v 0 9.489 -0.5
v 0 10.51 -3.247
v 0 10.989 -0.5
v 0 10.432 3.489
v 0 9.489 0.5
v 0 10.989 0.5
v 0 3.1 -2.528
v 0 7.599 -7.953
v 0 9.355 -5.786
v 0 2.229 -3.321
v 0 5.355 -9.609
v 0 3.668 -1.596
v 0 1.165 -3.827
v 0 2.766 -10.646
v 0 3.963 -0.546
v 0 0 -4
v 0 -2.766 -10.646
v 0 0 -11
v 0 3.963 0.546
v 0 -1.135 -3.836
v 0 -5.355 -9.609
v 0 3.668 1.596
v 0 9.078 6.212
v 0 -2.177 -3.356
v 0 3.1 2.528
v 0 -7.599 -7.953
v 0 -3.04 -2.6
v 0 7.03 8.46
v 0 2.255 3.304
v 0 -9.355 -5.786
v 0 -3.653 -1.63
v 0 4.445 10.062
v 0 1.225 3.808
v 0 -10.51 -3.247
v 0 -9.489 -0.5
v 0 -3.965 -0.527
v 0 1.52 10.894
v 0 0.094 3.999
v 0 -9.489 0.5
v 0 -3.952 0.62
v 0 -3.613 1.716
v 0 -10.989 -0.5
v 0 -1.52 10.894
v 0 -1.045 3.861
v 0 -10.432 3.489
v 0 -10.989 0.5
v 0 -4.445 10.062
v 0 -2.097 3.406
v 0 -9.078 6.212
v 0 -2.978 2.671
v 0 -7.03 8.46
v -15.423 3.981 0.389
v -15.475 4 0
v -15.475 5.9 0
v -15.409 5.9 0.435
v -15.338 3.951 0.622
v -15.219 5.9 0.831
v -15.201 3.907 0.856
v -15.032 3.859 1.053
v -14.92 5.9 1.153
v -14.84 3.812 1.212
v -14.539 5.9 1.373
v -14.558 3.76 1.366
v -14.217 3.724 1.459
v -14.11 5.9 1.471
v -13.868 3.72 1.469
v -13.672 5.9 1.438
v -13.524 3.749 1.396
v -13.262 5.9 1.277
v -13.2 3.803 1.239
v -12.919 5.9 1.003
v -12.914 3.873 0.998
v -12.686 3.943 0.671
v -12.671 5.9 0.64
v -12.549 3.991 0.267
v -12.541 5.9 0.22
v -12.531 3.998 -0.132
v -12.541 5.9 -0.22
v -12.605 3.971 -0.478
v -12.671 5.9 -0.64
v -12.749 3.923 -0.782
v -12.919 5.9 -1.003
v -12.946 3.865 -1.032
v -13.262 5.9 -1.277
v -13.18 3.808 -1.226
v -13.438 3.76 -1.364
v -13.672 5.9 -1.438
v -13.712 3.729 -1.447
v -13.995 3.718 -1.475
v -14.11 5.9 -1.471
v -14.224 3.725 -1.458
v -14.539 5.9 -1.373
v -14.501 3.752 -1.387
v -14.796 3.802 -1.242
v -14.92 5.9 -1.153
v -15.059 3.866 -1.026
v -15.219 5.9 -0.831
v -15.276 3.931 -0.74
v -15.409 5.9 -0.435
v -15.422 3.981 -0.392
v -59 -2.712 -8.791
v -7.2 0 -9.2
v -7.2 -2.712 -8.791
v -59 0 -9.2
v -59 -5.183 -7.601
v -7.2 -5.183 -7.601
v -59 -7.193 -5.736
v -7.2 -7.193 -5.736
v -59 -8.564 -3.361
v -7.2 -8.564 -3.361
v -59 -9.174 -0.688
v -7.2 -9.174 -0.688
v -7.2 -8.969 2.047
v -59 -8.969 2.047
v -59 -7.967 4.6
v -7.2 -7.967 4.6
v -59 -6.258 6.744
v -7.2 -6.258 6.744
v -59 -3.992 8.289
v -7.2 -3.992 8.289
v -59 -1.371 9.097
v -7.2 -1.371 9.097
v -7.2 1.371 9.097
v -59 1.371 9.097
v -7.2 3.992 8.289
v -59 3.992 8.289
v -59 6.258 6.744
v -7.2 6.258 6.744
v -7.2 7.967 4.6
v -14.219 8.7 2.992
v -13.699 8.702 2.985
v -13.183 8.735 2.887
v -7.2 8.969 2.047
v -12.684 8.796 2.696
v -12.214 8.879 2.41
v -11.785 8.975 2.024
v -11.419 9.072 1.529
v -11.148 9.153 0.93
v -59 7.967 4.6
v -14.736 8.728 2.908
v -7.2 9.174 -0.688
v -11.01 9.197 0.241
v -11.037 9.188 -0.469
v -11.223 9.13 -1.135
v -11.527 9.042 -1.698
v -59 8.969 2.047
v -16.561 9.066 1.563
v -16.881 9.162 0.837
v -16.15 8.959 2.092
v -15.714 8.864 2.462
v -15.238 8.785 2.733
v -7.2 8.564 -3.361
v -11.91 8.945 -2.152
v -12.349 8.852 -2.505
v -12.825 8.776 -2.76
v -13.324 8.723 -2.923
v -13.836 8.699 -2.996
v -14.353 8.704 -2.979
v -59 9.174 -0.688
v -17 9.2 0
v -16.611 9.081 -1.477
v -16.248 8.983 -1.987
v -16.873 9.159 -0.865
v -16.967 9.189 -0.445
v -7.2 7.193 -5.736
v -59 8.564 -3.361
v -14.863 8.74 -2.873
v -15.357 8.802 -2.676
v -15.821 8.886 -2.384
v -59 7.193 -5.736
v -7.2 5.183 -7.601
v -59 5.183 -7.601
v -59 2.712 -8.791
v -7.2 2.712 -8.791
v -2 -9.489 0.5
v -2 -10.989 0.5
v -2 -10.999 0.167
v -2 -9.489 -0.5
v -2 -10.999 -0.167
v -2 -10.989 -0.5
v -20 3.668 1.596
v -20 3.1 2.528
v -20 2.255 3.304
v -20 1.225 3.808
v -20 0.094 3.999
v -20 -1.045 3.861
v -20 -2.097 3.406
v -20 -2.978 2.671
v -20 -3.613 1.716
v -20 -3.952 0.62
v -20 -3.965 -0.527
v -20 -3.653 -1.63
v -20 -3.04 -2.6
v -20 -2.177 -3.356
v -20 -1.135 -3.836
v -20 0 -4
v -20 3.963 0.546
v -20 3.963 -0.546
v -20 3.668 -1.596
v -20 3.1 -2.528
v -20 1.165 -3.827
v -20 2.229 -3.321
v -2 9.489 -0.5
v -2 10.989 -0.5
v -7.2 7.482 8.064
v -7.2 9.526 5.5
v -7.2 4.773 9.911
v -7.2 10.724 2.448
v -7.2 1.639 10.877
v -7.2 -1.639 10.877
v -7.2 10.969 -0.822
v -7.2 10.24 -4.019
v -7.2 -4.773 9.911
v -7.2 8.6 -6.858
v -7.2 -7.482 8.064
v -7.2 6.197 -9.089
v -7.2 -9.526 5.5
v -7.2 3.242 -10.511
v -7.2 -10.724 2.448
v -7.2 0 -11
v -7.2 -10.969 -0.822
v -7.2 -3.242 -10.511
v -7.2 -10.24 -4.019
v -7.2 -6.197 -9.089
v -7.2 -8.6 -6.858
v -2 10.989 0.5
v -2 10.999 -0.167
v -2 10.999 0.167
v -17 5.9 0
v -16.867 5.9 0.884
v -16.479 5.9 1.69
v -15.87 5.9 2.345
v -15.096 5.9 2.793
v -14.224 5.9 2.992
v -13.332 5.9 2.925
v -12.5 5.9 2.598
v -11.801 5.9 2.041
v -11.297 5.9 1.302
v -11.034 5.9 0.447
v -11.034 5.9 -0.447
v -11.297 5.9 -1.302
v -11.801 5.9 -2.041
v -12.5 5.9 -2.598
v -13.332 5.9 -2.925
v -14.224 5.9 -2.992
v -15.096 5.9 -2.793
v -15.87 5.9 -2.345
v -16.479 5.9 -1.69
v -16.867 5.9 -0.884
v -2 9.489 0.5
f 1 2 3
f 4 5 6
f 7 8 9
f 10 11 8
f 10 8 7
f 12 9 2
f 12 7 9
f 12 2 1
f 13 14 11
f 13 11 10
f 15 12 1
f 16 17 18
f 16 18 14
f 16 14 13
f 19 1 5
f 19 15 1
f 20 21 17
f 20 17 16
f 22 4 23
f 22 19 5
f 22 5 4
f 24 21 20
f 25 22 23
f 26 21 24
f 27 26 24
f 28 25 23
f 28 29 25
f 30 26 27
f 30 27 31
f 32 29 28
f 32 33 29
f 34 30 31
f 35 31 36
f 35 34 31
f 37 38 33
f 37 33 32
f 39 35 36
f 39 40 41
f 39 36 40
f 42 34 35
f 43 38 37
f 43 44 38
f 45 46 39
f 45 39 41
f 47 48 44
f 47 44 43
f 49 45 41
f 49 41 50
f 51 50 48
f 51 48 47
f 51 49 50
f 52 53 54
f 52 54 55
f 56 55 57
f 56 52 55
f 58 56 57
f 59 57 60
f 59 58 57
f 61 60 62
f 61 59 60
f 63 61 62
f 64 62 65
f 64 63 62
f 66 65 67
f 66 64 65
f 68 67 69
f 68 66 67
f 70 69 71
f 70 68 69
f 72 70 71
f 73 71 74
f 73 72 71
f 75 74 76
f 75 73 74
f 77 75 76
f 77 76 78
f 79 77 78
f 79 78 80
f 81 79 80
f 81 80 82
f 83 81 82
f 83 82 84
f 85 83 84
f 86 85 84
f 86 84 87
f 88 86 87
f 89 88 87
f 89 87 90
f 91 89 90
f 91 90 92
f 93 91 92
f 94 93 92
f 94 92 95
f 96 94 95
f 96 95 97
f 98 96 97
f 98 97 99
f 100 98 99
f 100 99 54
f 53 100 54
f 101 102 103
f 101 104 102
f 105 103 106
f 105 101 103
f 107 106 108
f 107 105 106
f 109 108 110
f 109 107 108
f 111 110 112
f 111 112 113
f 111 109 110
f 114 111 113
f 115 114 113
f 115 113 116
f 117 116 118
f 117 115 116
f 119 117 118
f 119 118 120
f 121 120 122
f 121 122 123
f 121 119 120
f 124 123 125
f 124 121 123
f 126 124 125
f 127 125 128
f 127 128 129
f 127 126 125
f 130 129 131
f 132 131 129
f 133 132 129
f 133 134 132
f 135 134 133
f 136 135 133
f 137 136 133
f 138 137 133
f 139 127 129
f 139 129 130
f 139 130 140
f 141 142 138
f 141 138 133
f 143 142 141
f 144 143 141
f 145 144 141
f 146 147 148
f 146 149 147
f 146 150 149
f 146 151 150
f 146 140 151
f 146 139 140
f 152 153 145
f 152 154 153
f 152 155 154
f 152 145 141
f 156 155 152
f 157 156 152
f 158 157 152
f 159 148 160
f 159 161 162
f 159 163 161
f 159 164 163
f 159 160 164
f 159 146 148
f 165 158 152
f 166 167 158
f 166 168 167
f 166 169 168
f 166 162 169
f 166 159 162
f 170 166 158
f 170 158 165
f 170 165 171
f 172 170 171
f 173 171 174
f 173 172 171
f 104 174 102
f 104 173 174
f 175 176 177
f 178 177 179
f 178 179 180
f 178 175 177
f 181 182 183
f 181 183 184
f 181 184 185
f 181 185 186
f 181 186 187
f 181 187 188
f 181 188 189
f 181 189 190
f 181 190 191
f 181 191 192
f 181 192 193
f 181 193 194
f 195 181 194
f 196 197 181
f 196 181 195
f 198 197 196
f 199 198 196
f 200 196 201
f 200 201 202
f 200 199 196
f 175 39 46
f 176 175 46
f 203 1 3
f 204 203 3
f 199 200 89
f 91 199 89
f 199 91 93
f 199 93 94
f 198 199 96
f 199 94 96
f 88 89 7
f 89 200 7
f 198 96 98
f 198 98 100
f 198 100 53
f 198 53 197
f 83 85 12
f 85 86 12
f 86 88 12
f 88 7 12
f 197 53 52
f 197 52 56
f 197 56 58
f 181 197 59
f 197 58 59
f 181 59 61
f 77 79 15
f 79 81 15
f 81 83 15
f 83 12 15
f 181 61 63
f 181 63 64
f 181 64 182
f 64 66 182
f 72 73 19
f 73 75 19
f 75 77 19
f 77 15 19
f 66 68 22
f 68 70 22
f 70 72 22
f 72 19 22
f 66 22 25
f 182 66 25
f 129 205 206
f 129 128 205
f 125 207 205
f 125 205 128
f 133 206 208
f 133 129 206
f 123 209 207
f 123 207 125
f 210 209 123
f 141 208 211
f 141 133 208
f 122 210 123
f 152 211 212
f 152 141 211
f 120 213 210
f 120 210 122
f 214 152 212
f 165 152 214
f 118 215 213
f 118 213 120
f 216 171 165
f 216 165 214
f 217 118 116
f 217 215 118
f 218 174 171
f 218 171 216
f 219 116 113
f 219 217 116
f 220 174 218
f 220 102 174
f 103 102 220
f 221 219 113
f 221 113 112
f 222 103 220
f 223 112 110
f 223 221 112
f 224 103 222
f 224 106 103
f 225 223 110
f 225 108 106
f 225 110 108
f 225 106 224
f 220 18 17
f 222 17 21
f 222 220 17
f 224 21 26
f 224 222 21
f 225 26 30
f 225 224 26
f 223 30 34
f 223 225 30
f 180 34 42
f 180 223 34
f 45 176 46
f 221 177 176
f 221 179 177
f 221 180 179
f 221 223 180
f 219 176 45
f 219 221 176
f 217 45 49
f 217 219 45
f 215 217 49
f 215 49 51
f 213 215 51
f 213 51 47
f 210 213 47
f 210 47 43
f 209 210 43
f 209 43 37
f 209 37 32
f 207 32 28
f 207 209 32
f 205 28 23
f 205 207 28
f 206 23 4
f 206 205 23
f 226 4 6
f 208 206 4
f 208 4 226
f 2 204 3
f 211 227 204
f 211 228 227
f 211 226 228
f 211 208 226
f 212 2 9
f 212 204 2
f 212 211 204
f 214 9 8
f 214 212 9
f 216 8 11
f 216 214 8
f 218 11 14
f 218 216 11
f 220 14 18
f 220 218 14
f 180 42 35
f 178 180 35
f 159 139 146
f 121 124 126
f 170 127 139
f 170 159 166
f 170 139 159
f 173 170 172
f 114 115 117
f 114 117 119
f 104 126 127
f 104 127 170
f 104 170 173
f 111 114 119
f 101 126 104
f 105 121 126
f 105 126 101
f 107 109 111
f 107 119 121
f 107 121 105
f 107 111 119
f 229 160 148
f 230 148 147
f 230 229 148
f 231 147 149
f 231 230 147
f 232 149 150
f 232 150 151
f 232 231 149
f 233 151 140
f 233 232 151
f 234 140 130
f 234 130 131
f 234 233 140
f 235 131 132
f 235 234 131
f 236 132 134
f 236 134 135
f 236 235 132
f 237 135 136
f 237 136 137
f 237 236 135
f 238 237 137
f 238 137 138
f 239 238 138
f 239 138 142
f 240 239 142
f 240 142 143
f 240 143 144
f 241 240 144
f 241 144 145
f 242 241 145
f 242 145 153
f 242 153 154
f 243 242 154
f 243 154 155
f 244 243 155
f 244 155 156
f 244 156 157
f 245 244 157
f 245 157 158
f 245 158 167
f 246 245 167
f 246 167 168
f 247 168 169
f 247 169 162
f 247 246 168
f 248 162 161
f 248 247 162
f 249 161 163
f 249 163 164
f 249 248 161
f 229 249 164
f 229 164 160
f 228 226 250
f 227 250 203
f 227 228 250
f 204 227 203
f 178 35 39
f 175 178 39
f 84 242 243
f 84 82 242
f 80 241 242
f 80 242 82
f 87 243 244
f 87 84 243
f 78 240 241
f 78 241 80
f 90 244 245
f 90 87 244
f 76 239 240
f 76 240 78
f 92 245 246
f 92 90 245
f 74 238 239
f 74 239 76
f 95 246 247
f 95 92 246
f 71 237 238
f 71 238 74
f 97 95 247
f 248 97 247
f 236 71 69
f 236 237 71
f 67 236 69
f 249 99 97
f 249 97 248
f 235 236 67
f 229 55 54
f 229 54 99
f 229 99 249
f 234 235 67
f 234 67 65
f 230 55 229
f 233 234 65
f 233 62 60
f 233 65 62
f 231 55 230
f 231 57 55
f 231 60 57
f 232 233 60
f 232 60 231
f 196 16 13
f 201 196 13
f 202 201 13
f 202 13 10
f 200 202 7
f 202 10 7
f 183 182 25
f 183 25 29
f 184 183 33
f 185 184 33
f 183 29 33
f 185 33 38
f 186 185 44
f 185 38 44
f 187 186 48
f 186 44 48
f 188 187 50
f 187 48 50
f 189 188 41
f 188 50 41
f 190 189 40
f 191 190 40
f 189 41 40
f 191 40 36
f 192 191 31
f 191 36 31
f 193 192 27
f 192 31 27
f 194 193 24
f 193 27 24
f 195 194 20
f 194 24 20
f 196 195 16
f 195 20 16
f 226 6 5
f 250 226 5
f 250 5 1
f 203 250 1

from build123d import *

# Parameters (mm, degrees)
SKETCH2_R          = 4
CUT_EXTRUDE1_DEPTH = 20
SKETCH3_R          = 1.475
CUT_EXTRUDE3_DEPTH = 62.650709647
CUT_EXTRUDE4_START = 2.8
SKETCH3_4_R        = 3
SKETCH3_4_R_2      = 1.475
CUT_EXTRUDE4_DEPTH = 59.850709743
CUT_EXTRUDE5_START = -2
CUT_EXTRUDE5_DEPTH = 2


with BuildPart() as part:
    # Sketch1 → Revolve1 (revolve)
    with BuildSketch(Plane(origin=(0, 0, 0), x_dir=(1, 0, 0), z_dir=(0, 1, 0))):
        Polygon((0, 0), (0, 11), (-7.2, 11), (-7.2, 9.2), (-59, 9.2), (-59, 0), align=None)
    revolve(axis=Axis((0, 0, 0), (-1, 0, 0)))

    # Sketch2 → Cut-Extrude1 (cut)
    with BuildSketch(Plane(origin=(0, 0, 0), x_dir=(0, 0, -1), z_dir=(1, 0, 0))):
        Circle(SKETCH2_R)
    extrude(amount=-CUT_EXTRUDE1_DEPTH, mode=Mode.SUBTRACT)

    # Sketch3 → Cut-Extrude3 (cut, through all)
    with BuildSketch(Plane(origin=(0, 3.1, 0), x_dir=(-1, 0, 0), z_dir=(0, 1, 0))):
        with Locations((14, 0)):
            Circle(SKETCH3_R)
    extrude(amount=CUT_EXTRUDE3_DEPTH, mode=Mode.SUBTRACT)

    # Sketch3<4> → Cut-Extrude4 (cut, through all)
    with BuildSketch(Plane(origin=(0, 3.1, 0), x_dir=(-1, 0, 0), z_dir=(0, 1, 0)).offset(CUT_EXTRUDE4_START)):
        with Locations((14, 0)):
            Circle(SKETCH3_4_R)
        with Locations((14, 0)):
            Circle(SKETCH3_4_R_2, mode=Mode.SUBTRACT)
    extrude(amount=CUT_EXTRUDE4_DEPTH, mode=Mode.SUBTRACT)

    # Sketch2<6> → Cut-Extrude5 (cut)
    with BuildSketch(Plane(origin=(0, 0, 0), x_dir=(0, 0, -1), z_dir=(1, 0, 0)).offset(CUT_EXTRUDE5_START)):
        with BuildLine():
            Line((0.5, 9.488630488), (0.5, 10.988630488))
            ThreePointArc((0.5, 10.988630488), (0, 11), (-0.5, 10.988630488))
            Line((-0.5, 10.988630488), (-0.5, 9.488630488))
            Line((-0.5, 9.488630488), (0.5, 9.488630488))
        make_face()
        with BuildLine():
            ThreePointArc((-0.5, -10.988630488), (0, -11), (0.5, -10.988630488))
            Line((0.5, -10.988630488), (0.5, -9.488630488))
            Line((0.5, -9.488630488), (-0.5, -9.488630488))
            Line((-0.5, -9.488630488), (-0.5, -10.988630488))
        make_face()
    extrude(amount=CUT_EXTRUDE5_DEPTH, mode=Mode.SUBTRACT)


solid = part.part
